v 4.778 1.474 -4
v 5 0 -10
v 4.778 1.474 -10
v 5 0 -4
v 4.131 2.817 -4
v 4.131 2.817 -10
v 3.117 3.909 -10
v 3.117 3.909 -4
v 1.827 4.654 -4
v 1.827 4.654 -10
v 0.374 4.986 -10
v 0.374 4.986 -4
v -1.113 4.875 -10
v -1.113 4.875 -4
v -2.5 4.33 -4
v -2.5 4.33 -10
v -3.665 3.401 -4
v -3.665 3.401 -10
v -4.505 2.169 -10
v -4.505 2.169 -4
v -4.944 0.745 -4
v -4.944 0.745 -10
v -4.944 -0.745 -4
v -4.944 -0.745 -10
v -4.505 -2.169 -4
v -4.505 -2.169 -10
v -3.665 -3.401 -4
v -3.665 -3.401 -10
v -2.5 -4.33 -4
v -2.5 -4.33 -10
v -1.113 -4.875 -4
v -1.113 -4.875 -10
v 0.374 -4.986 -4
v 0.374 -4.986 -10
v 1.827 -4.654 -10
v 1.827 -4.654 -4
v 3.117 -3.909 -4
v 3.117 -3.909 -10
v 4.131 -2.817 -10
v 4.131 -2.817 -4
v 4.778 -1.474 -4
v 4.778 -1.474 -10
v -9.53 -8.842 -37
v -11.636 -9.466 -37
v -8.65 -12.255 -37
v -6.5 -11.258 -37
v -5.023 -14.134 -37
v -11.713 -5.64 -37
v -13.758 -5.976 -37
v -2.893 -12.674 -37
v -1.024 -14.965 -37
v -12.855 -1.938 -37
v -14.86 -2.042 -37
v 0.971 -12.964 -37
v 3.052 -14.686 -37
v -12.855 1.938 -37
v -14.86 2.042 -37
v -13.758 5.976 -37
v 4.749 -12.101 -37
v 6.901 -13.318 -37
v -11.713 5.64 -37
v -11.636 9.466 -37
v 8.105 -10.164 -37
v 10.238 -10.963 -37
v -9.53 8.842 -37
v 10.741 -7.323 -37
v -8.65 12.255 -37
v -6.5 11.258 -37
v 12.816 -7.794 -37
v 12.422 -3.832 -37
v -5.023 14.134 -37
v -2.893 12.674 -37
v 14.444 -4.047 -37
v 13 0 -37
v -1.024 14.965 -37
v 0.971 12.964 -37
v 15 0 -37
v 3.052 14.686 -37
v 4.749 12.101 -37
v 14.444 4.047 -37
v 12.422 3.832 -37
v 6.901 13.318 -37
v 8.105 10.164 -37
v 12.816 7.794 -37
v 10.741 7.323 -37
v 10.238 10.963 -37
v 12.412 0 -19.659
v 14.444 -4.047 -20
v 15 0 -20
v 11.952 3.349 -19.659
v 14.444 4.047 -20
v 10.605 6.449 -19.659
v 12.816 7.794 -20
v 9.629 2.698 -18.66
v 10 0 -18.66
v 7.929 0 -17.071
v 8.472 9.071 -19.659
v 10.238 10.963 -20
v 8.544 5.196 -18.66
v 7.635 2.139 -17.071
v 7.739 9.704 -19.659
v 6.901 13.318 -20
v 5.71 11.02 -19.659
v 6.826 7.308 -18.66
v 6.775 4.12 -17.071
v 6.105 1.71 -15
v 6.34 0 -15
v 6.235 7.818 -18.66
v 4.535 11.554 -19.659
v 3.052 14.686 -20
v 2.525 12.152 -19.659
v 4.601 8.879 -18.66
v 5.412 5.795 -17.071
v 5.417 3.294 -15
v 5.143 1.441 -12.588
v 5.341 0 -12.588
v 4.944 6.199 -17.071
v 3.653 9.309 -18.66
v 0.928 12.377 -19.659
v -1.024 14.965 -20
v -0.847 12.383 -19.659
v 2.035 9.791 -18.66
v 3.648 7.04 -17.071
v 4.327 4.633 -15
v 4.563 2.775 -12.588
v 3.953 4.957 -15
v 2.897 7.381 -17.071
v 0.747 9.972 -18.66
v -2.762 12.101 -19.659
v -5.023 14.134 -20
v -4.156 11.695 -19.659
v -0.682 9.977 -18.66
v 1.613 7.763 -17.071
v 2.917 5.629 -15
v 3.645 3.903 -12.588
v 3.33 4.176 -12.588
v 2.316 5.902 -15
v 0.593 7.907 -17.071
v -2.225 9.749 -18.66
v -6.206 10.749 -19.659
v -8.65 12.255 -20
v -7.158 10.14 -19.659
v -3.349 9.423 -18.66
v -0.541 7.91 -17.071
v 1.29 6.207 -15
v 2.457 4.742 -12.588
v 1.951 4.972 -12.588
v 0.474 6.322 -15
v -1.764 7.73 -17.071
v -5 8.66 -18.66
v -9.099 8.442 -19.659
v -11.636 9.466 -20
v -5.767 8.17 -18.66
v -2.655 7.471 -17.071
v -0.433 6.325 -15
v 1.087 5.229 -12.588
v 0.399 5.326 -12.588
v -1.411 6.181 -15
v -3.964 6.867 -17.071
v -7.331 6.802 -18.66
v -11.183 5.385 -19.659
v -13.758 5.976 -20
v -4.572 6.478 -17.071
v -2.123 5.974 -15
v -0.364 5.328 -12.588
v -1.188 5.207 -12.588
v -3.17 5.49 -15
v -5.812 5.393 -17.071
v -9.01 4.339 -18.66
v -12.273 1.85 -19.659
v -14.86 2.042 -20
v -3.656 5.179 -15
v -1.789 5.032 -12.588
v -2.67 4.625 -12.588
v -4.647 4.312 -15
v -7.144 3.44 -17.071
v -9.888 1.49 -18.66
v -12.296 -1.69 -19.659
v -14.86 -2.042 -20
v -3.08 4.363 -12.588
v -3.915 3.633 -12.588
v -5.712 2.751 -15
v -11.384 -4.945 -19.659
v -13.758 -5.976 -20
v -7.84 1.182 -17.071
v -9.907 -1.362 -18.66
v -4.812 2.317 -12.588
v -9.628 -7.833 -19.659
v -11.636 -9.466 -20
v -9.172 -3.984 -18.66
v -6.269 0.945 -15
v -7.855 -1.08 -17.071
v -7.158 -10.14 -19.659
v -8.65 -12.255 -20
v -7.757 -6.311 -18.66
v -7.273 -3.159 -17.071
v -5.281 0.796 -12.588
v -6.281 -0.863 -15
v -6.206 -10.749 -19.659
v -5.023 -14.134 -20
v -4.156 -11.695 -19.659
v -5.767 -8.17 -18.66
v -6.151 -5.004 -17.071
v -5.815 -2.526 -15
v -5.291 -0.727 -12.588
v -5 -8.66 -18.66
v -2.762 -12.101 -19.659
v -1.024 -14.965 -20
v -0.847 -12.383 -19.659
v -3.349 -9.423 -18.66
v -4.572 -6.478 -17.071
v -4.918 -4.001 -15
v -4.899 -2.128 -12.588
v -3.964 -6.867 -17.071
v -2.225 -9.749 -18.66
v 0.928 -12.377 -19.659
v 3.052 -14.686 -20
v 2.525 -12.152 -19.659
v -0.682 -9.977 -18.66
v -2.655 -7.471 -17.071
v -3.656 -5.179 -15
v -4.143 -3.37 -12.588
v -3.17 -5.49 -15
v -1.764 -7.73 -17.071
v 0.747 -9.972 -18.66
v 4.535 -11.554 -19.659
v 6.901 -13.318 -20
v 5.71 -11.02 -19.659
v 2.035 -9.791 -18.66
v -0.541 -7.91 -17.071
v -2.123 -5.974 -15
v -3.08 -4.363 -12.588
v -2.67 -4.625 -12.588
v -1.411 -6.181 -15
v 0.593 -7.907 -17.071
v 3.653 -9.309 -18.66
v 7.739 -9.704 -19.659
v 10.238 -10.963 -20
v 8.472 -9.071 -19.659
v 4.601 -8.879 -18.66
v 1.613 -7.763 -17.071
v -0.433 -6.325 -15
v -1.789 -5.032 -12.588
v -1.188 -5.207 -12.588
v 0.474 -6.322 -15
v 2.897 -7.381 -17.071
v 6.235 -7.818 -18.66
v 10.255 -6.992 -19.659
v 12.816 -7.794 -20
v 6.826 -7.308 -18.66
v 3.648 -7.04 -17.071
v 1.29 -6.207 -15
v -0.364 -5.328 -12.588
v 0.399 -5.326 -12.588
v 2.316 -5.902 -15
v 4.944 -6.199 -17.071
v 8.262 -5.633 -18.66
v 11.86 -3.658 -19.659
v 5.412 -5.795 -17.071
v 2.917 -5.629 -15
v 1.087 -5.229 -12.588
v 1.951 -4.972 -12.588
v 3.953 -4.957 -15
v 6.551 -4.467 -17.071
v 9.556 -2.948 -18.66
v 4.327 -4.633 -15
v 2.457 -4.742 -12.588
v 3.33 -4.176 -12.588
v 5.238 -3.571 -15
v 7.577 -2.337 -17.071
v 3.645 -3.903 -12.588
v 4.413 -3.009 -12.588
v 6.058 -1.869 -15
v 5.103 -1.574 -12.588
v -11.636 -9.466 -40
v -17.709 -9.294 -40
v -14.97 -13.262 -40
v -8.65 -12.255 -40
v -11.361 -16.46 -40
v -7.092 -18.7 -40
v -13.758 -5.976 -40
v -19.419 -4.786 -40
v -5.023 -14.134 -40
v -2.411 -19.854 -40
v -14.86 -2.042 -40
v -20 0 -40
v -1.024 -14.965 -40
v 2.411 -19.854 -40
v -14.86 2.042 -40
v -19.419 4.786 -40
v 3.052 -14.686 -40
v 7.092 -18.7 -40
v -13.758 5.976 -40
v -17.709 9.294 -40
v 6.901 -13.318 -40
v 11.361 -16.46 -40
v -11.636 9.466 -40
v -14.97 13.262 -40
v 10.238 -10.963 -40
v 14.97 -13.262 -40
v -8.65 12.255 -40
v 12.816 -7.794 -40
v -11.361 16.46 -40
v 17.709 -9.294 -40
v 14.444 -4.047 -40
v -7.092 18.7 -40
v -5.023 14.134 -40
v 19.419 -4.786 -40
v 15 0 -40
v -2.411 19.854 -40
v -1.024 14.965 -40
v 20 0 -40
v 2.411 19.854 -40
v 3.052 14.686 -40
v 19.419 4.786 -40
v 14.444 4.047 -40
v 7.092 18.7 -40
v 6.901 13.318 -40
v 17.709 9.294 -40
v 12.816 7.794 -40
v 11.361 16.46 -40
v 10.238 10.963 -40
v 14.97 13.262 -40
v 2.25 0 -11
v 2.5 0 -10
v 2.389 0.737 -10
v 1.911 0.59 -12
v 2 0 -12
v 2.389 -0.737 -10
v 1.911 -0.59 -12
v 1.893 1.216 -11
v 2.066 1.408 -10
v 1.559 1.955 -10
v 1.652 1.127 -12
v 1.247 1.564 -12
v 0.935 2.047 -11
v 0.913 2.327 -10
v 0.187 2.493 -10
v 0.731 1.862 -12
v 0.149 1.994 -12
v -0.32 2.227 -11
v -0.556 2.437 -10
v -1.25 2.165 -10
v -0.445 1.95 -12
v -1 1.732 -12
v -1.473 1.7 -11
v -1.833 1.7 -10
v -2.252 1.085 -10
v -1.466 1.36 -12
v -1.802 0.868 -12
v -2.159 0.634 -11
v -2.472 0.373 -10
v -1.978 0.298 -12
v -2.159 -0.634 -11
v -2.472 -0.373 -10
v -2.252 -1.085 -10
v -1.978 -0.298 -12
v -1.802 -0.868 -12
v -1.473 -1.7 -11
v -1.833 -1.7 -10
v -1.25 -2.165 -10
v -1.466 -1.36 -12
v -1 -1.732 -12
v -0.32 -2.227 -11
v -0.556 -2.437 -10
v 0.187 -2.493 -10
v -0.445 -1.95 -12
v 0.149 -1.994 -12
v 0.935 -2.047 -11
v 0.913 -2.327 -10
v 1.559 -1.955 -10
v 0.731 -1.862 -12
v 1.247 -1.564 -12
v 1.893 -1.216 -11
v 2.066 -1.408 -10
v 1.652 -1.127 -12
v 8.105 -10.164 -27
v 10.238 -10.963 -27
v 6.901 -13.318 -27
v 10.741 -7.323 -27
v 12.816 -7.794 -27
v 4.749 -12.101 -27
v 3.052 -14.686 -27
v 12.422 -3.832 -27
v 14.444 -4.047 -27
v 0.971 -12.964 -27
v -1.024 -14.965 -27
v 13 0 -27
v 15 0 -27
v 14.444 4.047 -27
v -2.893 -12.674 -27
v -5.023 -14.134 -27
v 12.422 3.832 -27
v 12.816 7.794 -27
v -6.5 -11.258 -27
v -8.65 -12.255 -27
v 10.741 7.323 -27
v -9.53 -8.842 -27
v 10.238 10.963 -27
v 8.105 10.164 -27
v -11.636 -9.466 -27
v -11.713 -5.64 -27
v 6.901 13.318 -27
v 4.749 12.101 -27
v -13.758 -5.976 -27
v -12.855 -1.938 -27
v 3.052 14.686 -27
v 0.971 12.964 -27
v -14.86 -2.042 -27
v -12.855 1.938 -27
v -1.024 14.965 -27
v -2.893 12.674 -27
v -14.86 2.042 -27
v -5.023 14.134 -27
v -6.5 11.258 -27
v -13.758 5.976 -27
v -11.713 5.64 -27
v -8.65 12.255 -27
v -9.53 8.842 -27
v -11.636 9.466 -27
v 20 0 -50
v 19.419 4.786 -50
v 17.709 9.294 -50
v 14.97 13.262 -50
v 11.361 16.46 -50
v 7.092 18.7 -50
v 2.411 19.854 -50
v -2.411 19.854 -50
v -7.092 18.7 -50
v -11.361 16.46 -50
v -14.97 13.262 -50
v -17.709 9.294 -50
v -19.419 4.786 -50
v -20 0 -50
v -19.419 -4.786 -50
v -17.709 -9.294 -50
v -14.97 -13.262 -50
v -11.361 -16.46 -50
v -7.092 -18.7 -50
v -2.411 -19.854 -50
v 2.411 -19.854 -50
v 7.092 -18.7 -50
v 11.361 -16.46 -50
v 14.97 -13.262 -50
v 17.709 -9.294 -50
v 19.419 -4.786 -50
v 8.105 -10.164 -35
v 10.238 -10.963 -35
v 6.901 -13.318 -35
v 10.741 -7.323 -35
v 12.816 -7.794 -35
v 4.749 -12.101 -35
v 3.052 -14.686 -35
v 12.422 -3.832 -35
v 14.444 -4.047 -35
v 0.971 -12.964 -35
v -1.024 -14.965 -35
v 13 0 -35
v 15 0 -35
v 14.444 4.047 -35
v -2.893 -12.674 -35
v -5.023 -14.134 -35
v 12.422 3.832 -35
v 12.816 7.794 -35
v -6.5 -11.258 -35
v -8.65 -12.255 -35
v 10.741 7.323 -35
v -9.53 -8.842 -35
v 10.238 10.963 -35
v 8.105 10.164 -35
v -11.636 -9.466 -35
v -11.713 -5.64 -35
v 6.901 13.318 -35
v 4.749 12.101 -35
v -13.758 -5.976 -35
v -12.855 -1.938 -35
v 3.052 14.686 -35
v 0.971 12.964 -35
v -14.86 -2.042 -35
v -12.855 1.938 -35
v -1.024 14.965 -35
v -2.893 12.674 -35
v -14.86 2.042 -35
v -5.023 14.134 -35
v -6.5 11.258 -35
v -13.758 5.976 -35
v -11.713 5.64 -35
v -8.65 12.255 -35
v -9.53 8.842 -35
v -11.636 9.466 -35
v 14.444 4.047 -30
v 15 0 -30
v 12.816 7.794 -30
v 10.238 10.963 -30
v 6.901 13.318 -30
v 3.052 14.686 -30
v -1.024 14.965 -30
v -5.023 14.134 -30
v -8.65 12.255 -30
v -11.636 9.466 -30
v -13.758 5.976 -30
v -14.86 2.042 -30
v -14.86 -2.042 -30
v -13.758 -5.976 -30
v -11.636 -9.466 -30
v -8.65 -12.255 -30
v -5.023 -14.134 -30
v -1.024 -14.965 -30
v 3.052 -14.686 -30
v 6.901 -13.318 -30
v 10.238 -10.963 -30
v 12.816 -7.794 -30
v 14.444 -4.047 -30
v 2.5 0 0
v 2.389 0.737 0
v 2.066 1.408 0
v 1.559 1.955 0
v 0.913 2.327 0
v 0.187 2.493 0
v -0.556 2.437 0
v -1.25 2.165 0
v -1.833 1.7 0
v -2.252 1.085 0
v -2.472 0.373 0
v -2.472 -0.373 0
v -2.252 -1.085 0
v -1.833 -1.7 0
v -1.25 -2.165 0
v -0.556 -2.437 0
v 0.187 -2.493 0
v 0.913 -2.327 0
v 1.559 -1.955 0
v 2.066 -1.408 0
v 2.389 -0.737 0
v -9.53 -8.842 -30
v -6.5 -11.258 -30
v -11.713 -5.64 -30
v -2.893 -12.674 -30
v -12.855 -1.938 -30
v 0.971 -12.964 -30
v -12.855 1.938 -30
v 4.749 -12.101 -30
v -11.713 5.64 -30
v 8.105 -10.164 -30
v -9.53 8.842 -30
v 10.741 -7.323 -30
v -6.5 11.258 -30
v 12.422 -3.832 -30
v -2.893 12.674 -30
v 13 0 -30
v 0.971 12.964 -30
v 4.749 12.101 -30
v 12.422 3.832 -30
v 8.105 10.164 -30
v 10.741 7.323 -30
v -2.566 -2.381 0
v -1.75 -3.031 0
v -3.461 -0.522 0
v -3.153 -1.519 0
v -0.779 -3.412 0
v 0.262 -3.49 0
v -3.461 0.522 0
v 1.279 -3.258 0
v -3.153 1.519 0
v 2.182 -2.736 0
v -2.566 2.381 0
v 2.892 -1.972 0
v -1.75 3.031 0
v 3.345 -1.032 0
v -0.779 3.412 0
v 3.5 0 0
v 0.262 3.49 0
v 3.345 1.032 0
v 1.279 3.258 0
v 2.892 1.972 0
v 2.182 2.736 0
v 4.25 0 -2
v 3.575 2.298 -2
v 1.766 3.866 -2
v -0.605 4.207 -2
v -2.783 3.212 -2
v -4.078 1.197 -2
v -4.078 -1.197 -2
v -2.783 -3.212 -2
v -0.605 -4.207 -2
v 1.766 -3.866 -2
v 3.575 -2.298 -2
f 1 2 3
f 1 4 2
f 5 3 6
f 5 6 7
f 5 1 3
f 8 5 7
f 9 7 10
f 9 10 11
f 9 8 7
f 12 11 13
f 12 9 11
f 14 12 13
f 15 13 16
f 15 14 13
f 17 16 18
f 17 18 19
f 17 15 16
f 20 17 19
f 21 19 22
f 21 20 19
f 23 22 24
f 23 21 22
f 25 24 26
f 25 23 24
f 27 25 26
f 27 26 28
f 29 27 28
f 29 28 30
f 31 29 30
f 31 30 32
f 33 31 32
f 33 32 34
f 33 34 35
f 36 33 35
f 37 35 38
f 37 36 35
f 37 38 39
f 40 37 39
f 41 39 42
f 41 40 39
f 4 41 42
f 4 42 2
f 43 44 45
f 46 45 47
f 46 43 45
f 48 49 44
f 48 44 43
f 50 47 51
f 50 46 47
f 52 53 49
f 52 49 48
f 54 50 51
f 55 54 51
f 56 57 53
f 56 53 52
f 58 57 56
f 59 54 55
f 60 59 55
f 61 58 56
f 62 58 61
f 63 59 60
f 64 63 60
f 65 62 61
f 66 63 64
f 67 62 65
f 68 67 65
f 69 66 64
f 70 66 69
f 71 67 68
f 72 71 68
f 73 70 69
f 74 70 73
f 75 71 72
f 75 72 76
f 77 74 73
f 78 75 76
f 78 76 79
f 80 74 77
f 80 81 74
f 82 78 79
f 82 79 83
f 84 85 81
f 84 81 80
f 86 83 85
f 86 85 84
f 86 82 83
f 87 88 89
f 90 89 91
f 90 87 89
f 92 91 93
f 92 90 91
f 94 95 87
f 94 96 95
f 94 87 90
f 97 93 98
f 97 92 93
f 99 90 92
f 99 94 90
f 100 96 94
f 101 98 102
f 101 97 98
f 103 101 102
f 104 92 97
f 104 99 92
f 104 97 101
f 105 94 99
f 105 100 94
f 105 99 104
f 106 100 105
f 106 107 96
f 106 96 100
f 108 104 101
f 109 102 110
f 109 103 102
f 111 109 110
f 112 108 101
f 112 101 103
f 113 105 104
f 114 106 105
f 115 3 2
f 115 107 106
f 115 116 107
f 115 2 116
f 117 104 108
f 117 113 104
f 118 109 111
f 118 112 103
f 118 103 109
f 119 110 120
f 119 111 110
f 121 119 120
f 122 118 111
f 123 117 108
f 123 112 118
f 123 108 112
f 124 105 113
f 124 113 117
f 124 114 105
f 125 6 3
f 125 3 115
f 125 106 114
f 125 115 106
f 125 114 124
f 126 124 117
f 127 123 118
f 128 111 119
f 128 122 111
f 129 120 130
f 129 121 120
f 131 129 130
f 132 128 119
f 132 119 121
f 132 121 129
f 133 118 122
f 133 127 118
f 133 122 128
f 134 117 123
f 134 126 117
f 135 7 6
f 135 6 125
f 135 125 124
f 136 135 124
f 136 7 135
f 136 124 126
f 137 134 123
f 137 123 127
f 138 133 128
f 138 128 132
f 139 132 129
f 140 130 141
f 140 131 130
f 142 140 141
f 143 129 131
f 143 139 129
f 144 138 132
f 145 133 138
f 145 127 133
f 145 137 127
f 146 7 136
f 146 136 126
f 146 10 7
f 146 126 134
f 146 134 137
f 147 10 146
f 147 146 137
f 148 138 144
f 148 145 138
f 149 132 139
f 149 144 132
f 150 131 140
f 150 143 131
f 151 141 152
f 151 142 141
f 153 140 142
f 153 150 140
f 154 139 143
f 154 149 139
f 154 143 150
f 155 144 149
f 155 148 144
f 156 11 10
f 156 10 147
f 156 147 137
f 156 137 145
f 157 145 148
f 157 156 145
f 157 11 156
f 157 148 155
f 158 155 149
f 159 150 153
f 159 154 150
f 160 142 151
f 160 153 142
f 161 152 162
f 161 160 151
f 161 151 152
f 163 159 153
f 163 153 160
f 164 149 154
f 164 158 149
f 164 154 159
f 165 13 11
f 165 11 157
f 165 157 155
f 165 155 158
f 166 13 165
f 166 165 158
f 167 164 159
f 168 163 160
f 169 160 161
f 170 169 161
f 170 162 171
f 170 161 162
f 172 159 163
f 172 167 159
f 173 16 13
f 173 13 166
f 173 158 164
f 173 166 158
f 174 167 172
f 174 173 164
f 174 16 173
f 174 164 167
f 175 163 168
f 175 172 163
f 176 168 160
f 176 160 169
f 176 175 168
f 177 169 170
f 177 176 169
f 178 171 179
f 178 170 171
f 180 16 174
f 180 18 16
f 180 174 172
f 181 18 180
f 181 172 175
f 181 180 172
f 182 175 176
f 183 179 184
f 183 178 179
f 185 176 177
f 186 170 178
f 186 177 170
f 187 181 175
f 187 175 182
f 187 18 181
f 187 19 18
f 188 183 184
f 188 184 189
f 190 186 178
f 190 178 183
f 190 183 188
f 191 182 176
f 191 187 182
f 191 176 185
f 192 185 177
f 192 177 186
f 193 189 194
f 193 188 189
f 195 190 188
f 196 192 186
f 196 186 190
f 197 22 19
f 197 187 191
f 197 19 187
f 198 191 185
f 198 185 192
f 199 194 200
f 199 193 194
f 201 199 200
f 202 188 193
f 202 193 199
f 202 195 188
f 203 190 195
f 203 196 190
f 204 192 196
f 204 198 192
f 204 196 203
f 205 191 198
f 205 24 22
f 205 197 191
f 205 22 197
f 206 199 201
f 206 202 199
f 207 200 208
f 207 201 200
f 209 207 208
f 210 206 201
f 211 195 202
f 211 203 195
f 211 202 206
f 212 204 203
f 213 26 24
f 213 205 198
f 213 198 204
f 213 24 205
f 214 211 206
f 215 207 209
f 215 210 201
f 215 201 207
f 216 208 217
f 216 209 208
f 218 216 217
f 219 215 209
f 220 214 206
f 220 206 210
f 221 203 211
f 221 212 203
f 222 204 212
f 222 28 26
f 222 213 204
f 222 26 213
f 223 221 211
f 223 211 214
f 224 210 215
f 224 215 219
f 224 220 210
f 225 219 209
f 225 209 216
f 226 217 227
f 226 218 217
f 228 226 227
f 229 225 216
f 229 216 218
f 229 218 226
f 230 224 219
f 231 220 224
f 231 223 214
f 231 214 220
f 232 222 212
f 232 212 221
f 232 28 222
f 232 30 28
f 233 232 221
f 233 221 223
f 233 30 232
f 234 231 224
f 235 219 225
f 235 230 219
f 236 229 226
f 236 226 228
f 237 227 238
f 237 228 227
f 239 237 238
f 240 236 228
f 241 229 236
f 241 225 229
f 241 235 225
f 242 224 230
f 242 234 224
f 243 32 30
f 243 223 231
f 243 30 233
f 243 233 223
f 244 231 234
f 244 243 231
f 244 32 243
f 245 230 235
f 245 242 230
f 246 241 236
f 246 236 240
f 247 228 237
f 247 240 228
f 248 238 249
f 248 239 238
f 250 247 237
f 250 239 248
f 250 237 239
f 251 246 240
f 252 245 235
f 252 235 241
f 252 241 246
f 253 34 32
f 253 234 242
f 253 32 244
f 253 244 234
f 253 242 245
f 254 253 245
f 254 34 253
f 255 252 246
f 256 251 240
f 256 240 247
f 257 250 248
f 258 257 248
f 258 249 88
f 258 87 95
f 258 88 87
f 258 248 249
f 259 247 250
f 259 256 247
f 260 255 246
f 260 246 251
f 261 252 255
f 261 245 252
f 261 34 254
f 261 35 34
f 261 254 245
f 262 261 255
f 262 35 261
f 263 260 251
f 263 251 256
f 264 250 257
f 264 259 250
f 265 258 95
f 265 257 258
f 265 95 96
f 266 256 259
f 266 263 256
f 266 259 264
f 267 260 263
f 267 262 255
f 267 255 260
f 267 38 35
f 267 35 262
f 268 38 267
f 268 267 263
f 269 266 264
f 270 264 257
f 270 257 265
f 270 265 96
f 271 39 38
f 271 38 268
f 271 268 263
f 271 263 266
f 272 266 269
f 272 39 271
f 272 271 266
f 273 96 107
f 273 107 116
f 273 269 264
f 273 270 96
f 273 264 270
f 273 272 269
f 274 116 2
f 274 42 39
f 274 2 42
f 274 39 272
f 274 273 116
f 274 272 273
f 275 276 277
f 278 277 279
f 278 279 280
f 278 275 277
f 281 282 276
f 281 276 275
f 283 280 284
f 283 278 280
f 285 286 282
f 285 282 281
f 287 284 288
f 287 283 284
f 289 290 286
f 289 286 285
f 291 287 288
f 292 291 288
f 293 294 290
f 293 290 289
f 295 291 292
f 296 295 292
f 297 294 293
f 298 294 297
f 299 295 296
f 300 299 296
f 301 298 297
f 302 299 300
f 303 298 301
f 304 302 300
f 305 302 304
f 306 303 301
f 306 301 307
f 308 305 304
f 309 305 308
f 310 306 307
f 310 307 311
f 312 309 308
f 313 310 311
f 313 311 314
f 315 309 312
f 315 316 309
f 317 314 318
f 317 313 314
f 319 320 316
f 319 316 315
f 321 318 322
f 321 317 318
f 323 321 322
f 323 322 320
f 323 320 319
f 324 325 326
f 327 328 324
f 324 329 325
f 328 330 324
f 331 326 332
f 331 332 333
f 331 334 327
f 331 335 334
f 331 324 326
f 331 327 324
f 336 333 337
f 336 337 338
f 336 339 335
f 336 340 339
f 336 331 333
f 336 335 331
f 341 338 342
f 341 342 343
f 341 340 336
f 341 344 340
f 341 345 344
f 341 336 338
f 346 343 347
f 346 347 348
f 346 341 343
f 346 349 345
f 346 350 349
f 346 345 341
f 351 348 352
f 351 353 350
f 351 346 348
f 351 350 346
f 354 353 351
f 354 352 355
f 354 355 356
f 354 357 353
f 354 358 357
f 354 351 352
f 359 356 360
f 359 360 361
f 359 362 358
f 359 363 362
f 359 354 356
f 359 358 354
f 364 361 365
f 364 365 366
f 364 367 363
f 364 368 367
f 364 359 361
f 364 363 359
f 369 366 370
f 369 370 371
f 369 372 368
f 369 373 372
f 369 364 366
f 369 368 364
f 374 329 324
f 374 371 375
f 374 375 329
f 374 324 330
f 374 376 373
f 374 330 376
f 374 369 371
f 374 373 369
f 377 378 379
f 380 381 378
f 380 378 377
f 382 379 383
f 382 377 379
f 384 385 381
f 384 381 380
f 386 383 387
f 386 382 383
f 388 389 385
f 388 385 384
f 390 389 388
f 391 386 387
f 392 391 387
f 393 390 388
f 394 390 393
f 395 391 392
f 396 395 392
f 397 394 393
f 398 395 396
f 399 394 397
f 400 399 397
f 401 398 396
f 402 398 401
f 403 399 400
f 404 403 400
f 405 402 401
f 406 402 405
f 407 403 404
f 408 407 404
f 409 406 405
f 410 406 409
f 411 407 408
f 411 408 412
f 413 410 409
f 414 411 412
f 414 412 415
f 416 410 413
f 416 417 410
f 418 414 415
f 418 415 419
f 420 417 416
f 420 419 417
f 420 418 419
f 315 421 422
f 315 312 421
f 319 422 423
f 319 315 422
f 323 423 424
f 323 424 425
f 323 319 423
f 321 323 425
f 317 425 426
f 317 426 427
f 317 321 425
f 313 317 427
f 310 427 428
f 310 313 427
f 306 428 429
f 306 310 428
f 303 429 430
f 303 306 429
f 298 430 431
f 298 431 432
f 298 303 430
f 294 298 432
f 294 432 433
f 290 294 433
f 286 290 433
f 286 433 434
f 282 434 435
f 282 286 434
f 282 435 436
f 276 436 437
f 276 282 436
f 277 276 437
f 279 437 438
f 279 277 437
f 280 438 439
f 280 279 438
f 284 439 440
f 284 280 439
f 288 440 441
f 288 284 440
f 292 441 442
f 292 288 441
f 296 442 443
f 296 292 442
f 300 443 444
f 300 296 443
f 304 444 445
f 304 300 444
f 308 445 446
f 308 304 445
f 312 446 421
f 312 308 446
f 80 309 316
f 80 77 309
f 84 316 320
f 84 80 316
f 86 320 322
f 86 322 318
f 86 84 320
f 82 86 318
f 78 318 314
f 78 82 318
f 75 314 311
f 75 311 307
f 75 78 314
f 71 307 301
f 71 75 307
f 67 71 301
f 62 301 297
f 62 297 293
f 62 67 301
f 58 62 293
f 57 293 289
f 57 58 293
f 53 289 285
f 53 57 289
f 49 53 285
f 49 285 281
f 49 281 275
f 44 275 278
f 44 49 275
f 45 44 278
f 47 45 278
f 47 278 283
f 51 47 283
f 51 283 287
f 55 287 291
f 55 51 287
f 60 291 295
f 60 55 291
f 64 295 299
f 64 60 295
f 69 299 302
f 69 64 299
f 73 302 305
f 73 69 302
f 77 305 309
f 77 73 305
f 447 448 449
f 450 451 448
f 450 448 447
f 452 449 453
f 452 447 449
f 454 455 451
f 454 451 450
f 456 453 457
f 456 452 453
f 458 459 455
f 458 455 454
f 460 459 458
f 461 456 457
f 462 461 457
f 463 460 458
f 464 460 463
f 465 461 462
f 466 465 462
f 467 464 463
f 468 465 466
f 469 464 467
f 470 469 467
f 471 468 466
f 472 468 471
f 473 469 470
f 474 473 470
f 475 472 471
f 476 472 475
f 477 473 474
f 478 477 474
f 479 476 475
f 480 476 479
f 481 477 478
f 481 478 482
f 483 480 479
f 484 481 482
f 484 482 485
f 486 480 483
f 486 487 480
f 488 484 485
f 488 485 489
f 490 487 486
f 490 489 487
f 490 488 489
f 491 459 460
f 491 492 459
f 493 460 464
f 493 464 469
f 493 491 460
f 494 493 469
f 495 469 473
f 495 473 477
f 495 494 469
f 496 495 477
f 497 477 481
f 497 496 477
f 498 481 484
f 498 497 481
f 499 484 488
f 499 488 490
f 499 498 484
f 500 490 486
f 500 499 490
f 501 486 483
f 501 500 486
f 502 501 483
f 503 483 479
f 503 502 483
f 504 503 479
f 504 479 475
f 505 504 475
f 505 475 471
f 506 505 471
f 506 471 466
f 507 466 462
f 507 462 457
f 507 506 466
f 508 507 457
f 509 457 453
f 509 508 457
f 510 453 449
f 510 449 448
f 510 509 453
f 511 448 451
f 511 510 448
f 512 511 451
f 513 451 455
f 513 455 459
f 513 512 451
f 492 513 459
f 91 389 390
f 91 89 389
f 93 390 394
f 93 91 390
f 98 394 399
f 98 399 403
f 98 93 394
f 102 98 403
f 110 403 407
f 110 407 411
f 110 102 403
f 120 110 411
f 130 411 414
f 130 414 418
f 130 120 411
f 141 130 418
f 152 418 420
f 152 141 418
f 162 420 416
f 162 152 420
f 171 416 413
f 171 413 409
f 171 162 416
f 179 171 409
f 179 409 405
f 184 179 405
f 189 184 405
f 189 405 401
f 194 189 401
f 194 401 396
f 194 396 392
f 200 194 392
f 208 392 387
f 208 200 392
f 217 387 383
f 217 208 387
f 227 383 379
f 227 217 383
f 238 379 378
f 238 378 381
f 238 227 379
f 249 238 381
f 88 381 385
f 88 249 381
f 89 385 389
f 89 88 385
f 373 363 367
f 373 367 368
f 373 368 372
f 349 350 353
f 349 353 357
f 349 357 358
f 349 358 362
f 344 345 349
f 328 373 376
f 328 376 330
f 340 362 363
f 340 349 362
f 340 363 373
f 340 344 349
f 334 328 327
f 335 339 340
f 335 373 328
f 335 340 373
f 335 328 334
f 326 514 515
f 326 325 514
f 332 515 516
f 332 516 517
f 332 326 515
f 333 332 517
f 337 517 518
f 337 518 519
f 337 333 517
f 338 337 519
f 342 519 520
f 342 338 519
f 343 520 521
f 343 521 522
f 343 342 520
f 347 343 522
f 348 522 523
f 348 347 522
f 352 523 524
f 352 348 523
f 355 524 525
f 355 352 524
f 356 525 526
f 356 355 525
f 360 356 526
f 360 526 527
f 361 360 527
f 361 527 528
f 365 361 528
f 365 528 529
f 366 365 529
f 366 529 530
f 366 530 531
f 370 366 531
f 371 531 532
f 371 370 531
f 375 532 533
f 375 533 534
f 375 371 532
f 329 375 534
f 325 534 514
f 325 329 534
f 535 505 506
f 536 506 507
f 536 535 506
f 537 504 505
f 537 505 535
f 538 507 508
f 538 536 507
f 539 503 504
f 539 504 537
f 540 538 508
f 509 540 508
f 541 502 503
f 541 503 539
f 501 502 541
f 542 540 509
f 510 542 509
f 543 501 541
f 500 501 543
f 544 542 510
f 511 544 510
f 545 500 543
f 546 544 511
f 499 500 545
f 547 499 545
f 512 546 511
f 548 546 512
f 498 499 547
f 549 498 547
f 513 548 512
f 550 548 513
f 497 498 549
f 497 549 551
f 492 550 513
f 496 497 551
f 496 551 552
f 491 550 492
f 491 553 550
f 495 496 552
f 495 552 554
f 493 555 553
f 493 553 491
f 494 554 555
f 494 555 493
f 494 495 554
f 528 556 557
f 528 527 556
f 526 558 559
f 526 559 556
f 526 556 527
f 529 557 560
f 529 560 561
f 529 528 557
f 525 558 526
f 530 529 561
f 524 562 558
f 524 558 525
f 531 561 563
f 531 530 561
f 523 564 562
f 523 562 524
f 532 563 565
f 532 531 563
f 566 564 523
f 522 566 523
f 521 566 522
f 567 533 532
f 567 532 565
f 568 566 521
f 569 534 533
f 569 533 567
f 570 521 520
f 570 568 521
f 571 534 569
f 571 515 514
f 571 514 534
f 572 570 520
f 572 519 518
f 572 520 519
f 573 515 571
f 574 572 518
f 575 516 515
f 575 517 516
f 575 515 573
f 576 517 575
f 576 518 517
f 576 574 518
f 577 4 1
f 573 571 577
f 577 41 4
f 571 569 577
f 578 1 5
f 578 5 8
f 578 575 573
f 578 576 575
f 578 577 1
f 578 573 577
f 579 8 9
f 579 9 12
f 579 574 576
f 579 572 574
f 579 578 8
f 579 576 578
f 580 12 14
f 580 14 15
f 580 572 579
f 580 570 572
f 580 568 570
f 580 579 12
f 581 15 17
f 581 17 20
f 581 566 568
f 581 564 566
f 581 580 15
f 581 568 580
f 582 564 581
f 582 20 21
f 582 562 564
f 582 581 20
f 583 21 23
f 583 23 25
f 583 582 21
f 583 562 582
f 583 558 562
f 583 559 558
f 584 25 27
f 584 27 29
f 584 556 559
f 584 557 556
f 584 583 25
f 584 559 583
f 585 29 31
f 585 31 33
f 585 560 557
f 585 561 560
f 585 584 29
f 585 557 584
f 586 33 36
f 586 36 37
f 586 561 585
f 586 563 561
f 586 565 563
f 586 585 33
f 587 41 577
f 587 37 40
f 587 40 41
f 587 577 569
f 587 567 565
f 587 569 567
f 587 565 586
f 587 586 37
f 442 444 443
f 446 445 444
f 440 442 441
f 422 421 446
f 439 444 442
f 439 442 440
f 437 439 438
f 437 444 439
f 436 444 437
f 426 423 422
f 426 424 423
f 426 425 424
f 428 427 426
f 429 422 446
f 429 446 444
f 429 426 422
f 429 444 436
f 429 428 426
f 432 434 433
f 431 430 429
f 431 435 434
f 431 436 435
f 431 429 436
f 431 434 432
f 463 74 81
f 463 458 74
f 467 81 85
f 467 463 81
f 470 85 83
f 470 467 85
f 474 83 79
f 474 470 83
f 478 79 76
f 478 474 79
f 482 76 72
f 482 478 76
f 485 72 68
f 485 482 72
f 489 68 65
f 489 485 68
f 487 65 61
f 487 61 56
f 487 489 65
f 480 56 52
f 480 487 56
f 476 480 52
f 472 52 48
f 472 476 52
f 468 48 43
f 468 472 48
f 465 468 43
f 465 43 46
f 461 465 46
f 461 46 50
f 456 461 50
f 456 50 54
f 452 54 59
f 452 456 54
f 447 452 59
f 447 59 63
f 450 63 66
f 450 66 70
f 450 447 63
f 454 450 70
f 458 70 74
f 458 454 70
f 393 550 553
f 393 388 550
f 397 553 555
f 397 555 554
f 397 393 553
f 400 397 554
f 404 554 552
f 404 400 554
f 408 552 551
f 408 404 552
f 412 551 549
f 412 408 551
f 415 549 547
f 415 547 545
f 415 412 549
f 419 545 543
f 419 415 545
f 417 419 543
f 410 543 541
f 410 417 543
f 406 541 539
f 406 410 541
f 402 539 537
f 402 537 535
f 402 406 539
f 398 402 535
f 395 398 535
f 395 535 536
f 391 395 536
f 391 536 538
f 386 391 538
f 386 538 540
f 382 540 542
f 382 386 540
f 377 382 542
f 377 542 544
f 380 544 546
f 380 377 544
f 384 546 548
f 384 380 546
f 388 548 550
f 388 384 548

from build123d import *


with BuildPart() as f1:
    # F0 (on Front) → F1 (revolve)
    with BuildSketch(Plane.XZ):
        with BuildLine():
            Line((3.5, 0), (2.5, 0))
            Line((2.5, 0), (2.5, -10))
            Line((2.5, -10), (2, -12))
            Line((2, -12), (0, -12))
            Line((0, -12), (0, -50))
            Line((0, -50), (20, -50))
            Line((20, -50), (20, -40))
            Line((20, -40), (15, -40))
            Line((15, -40), (15, -37))
            Line((15, -37), (13, -37))
            Line((13, -37), (13, -35))
            Line((13, -35), (15, -35))
            Line((15, -35), (15, -30))
            Line((15, -30), (13, -30))
            Line((13, -30), (13, -27))
            Line((13, -27), (15, -27))
            Line((15, -27), (15, -20))
            ThreePointArc((15, -20), (7.9289321881, -17.0710678119), (5, -10))
            Line((5, -10), (5, -4))
            Line((5, -4), (3.5, 0))
        make_face()
    revolve(axis=Axis((0, 0, -25), (0, 0, 1)))


solid = f1.part
